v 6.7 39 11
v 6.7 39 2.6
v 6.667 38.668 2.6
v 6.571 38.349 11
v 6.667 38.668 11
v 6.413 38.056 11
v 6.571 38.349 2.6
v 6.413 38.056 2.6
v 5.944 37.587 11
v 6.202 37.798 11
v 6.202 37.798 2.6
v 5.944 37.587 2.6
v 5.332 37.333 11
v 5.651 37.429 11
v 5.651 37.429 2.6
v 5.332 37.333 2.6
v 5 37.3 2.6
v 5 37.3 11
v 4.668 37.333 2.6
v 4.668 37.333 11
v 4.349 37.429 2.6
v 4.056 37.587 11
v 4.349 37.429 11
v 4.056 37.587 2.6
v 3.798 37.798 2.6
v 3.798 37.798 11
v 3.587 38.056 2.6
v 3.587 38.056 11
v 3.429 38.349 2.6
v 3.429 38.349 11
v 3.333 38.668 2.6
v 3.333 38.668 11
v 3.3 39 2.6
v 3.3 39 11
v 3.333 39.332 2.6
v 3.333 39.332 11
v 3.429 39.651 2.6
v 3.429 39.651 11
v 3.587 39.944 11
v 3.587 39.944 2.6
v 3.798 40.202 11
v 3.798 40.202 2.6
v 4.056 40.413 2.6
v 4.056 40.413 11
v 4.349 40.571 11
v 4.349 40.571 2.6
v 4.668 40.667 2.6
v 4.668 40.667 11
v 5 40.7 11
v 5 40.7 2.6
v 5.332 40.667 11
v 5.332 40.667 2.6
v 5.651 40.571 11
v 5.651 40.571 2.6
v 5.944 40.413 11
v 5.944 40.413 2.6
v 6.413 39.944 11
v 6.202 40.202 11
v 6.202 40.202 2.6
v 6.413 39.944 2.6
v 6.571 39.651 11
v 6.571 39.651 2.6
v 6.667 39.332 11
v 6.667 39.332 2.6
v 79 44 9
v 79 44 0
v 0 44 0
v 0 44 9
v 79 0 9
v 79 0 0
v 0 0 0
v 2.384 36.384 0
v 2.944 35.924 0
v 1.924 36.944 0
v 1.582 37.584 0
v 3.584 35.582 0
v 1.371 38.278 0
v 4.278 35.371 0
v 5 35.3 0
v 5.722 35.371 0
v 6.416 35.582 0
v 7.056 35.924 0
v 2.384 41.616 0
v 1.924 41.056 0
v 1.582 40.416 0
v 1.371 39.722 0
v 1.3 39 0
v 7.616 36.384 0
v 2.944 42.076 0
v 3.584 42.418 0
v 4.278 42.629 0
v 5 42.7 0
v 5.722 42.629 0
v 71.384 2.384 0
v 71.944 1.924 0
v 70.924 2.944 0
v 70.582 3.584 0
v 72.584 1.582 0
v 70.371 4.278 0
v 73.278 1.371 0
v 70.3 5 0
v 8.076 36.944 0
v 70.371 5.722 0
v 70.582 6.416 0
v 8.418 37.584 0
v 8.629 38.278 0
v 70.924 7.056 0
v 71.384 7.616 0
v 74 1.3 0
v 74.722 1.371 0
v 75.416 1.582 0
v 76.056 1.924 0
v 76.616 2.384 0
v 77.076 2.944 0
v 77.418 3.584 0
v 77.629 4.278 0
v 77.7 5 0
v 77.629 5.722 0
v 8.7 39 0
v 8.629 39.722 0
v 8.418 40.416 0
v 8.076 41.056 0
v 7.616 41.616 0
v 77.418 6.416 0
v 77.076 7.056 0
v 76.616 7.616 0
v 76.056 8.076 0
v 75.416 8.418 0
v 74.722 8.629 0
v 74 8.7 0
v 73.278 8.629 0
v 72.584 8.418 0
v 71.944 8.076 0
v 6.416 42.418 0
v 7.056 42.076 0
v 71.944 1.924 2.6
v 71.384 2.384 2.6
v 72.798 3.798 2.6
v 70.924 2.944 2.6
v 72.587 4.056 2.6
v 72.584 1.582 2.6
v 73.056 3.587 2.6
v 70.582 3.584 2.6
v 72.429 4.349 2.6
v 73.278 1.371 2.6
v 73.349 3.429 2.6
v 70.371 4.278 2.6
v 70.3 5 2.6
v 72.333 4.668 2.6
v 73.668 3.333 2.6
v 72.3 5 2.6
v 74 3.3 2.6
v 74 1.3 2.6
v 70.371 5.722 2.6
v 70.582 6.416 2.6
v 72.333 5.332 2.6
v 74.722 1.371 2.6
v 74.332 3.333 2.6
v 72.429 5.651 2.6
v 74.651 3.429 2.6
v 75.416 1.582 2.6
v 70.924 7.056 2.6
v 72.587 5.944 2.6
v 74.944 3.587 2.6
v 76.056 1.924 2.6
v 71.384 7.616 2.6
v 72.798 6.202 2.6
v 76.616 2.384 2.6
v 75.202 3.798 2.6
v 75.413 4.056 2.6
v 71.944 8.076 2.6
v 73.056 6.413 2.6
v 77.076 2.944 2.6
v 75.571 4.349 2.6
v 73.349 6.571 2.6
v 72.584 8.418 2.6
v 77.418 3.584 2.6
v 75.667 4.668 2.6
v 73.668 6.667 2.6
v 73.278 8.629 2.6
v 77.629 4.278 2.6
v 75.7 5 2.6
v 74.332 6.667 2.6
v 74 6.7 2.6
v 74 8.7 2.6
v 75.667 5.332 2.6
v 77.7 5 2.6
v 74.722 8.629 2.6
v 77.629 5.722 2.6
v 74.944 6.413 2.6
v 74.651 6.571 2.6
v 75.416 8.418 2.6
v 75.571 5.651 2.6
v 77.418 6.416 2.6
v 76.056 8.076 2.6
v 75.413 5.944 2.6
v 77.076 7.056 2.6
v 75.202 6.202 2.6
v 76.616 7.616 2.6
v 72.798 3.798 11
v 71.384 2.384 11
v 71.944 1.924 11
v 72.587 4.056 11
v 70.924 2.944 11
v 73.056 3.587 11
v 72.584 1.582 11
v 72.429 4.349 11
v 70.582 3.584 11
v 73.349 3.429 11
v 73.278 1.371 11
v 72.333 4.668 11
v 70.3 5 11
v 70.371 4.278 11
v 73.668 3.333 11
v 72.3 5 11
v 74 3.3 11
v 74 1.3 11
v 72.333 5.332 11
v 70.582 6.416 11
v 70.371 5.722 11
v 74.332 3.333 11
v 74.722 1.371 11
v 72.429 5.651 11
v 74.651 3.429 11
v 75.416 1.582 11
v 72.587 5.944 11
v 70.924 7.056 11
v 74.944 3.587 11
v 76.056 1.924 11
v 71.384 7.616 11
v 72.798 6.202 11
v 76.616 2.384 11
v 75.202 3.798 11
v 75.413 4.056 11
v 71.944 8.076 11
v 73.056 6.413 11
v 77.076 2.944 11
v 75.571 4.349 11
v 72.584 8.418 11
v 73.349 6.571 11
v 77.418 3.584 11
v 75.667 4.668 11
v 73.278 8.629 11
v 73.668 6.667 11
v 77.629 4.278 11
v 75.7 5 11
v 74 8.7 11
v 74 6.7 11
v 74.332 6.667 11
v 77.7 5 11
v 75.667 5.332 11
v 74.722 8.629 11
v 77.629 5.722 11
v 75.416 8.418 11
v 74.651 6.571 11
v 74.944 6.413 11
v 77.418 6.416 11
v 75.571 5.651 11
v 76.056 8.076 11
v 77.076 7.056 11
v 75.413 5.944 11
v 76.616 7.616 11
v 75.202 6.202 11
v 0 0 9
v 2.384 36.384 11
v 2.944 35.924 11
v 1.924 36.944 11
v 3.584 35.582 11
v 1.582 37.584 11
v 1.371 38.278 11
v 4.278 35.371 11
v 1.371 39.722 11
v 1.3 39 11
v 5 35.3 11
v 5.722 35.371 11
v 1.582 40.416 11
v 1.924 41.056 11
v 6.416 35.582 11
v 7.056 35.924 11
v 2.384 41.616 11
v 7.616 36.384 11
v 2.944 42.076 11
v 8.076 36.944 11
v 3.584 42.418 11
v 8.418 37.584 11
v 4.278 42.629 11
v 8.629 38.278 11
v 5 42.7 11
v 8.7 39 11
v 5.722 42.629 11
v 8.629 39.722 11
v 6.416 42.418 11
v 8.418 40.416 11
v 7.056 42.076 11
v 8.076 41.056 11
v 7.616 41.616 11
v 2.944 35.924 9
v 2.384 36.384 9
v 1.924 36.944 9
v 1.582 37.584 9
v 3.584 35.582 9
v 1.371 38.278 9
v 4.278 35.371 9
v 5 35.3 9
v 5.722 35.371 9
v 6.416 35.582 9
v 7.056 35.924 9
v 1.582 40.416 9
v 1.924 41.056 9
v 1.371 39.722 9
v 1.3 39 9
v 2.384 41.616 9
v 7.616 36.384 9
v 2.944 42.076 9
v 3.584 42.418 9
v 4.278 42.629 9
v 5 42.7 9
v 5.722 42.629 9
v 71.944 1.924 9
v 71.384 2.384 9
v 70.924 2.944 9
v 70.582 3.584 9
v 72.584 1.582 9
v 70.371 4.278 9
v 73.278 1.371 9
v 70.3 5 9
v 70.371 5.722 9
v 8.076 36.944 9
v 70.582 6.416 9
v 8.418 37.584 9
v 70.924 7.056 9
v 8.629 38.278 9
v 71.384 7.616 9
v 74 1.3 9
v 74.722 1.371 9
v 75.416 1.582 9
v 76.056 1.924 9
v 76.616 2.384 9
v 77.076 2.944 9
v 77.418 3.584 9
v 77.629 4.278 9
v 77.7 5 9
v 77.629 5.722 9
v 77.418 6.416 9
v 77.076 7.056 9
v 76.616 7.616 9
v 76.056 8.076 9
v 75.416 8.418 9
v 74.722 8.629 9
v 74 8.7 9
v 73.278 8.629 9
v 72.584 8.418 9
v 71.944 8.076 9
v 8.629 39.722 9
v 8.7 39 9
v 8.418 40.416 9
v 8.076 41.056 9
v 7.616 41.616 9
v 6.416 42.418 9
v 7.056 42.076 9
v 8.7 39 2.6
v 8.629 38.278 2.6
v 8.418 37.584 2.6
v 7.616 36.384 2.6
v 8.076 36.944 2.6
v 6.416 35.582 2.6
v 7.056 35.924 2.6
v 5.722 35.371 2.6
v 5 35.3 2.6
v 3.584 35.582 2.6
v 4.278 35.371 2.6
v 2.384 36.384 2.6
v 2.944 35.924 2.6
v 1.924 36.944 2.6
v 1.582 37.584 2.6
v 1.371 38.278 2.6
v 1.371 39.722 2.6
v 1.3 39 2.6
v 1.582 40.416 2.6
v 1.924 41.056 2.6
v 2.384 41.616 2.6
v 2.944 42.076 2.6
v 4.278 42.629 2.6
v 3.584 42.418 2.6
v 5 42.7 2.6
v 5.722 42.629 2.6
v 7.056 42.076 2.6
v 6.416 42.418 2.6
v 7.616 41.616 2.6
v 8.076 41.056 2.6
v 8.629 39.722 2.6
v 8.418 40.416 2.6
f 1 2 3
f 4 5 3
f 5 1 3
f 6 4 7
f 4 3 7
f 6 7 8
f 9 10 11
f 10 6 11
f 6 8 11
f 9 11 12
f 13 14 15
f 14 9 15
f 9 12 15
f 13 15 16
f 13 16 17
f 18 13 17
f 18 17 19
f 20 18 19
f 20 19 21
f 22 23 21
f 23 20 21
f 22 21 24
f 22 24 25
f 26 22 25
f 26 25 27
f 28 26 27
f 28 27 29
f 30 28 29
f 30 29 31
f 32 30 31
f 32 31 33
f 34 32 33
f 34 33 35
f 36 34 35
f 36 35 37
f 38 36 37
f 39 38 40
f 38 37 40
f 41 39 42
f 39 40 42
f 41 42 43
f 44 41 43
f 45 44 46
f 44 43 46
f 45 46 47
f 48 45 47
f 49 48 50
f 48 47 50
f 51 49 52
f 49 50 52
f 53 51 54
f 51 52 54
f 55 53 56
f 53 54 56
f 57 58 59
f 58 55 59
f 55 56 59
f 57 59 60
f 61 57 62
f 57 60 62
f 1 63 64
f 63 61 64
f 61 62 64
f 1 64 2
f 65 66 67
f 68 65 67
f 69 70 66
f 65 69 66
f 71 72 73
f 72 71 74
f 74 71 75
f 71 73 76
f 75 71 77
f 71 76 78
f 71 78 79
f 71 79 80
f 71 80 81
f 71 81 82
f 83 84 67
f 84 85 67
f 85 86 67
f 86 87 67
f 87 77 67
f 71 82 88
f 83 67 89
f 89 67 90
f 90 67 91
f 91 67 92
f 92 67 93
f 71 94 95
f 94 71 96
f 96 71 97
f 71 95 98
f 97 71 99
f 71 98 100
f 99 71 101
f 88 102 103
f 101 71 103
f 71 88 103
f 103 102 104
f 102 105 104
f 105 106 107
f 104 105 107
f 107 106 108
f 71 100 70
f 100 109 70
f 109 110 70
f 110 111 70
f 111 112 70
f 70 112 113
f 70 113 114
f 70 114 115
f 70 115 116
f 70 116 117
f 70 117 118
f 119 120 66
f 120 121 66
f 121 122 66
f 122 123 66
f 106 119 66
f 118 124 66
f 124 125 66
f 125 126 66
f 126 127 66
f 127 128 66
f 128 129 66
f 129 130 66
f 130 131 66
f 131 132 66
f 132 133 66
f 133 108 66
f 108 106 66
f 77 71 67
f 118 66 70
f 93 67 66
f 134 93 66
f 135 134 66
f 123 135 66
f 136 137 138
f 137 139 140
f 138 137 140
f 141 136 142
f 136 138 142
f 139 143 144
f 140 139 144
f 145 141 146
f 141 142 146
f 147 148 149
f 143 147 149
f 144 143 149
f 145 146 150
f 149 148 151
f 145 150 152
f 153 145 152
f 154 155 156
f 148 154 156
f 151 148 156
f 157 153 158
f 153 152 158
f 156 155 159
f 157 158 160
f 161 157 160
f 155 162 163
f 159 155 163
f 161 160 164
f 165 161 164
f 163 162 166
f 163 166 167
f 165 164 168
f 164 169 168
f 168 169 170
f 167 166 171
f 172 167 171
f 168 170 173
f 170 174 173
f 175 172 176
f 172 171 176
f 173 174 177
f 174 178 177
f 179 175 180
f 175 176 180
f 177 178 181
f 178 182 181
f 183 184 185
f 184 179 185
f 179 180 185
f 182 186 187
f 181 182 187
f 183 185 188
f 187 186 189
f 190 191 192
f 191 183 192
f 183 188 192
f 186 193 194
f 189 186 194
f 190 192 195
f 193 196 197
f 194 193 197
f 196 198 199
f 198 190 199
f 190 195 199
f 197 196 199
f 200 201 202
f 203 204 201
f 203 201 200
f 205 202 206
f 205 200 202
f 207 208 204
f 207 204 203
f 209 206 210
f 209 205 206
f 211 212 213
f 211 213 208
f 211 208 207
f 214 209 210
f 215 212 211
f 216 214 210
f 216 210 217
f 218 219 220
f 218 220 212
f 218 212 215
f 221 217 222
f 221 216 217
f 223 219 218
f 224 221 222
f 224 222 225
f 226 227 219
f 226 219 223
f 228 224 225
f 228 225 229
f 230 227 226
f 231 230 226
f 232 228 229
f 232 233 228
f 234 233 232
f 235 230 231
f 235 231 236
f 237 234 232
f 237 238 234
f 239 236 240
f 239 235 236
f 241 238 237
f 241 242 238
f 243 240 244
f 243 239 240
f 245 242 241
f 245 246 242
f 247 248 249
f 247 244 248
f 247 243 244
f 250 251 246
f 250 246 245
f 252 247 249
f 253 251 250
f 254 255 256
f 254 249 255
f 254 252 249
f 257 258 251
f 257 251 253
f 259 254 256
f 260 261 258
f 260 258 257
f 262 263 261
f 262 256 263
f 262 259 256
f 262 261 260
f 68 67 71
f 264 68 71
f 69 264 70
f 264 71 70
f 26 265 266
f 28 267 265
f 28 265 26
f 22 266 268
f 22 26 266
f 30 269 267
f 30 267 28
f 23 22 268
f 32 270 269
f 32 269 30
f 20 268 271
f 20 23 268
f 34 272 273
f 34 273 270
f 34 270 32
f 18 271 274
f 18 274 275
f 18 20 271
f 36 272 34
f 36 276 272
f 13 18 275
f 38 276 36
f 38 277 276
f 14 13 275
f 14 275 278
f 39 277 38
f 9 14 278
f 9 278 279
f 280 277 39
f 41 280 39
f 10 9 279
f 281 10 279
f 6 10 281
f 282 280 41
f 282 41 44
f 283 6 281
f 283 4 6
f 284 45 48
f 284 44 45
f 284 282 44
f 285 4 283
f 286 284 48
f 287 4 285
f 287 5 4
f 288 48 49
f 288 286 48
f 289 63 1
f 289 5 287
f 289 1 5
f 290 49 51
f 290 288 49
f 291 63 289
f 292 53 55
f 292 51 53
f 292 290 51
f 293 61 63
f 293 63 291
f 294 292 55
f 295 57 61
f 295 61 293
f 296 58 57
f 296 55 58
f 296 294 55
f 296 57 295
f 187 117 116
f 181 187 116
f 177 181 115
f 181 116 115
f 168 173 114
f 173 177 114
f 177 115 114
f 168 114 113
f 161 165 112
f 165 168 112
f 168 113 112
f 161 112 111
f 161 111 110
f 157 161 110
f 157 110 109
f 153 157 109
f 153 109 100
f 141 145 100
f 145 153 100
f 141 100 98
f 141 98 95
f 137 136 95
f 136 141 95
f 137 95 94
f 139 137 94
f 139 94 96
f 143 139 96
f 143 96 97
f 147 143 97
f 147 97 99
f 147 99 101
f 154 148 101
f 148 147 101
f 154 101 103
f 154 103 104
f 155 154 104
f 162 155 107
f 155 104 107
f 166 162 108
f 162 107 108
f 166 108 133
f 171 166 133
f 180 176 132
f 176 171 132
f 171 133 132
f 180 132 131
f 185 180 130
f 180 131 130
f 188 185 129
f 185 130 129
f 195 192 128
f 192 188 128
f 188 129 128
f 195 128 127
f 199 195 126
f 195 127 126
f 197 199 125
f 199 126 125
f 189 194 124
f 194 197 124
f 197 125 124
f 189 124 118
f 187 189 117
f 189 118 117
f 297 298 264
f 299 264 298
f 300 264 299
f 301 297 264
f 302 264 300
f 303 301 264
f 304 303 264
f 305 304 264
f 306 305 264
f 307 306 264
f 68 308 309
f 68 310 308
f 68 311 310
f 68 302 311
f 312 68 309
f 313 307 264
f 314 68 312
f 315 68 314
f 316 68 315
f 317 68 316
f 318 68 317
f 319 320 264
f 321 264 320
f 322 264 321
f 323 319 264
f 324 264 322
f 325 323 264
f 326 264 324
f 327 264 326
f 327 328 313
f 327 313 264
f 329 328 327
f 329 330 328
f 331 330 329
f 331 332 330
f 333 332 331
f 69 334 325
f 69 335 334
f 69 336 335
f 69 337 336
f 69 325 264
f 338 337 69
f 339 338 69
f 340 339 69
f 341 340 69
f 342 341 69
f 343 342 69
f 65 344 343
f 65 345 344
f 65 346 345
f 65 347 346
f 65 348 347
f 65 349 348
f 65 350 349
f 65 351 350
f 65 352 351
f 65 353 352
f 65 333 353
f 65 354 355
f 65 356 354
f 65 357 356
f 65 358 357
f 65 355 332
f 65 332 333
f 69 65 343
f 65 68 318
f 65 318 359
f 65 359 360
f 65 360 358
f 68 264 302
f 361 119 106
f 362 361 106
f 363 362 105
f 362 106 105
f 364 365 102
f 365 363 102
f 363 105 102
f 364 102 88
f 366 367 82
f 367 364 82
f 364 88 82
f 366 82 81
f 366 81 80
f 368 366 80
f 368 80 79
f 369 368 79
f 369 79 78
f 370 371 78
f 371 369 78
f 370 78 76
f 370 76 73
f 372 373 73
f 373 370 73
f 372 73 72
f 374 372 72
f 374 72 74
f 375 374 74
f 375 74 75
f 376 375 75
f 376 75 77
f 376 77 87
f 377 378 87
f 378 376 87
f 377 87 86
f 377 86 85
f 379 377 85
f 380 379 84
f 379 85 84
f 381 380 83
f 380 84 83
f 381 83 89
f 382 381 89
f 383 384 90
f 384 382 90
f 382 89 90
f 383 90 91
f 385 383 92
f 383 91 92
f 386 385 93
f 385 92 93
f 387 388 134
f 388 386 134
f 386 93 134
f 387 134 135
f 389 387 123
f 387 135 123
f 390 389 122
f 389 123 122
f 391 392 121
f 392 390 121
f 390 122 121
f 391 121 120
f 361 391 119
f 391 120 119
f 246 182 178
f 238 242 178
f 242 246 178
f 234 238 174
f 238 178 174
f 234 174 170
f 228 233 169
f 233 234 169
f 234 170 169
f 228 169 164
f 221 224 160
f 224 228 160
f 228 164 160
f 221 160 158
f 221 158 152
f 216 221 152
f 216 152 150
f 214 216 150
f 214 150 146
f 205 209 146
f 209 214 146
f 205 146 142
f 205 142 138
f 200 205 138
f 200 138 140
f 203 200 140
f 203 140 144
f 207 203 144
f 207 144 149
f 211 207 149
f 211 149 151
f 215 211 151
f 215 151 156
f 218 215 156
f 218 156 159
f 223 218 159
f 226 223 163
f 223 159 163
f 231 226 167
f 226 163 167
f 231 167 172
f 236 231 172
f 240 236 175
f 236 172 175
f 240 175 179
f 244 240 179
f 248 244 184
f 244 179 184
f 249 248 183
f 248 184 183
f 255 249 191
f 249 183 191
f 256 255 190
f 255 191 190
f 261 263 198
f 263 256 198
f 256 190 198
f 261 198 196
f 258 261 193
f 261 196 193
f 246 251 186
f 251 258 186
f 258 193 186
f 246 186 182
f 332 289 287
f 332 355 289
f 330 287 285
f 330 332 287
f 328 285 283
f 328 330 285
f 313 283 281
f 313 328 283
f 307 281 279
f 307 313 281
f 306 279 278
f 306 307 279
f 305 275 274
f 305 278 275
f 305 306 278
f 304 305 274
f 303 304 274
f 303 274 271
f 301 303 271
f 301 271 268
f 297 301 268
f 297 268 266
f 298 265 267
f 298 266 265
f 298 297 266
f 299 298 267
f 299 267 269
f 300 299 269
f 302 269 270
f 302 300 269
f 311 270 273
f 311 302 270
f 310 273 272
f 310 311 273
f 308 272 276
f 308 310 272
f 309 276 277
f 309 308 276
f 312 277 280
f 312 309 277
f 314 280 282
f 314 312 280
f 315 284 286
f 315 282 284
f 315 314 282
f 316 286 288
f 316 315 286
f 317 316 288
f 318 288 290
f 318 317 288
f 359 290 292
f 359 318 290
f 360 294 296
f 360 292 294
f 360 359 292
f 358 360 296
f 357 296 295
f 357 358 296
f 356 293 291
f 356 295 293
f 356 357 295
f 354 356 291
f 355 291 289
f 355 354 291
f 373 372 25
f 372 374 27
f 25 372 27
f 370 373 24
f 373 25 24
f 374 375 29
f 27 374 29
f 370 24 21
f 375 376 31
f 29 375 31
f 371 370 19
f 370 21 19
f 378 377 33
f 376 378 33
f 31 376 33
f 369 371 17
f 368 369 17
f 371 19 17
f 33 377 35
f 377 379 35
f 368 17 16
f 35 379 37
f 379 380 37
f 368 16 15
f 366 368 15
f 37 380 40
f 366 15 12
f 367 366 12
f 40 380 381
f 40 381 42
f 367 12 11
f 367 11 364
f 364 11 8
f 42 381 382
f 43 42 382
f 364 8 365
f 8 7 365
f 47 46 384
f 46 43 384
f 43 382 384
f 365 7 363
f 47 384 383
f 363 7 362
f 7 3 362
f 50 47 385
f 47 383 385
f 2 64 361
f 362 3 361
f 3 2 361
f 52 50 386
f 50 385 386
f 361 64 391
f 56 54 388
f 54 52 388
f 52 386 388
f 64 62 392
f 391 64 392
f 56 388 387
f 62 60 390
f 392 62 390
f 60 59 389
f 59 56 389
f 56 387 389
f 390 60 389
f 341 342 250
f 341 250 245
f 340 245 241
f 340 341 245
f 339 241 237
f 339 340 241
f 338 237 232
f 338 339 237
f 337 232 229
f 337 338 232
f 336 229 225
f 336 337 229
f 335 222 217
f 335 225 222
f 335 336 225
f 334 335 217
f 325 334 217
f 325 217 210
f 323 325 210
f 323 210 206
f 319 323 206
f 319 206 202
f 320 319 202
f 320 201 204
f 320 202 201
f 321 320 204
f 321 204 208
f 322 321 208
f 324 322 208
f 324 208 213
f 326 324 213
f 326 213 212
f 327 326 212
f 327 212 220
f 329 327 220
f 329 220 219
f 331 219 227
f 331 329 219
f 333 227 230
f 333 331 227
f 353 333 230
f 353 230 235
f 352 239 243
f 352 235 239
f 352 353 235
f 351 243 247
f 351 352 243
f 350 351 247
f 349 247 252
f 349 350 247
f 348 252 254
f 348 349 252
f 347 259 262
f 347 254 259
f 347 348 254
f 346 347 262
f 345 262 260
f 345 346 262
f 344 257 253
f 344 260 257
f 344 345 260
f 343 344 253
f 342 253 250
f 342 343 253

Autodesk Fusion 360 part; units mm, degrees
sketch "Sketch1" plane through (0, 0, 0) normal (0, 0, 1) x (1, 0, 0)
  line L0 (0, 0) -> (79, 0)
  line L1 (79, 0) -> (79, 44)
  line L2 (79, 44) -> (0, 44)
  line L3 (0, 44) -> (0, 0)
  circle A0 centre (5, 39) radius 1.7
  circle A1 centre (5, 39) radius 3.7
  circle A2 centre (74, 5) radius 1.7
  circle A3 centre (74, 5) radius 3.7
  line L4 (1.2, 42.8) -> (77.8, 42.8)
  line L5 (77.8, 42.8) -> (77.8, 1.2)
  line L6 (77.8, 1.2) -> (1.2, 1.2)
  line L7 (1.2, 1.2) -> (1.2, 42.8)
  dimension "d1" = 44
  dimension "d2" = 79
  dimension "d30" = 3.4
  dimension "d31" = 7.4
  dimension "d34" = 3.4
  dimension "d35" = 7.4
  dimension "d46" = 1.2
  dimension "d47" = 1.2
  dimension "d48" = 1.2
  dimension "d49" = 1.2
  dimension "d50" = 3.8
  dimension "d51" = 3.8
  dimension "d52" = 3.8
  dimension "d53" = 3.8
extrude "Extrude5" add sketch "Sketch1" along normal blind 11 contours A1 | A3 makes body 1 at (8.6954, 38.8156, 7.3333) makes body 2 at (77.6954, 4.8156, 7.3333)
extrude "Extrude6" add sketch "Sketch1" along normal blind 9 contours L0 L1 L2 L3 | L4 L5 L6 L7 bodies 1 2
extrude "Extrude7" cut sketch "Sketch1" along normal blind 2.6 contours A1 bodies 1
extrude "Extrude8" cut sketch "Sketch1" along normal blind 2.6 contours A0 | A1 | A3 bodies 1
